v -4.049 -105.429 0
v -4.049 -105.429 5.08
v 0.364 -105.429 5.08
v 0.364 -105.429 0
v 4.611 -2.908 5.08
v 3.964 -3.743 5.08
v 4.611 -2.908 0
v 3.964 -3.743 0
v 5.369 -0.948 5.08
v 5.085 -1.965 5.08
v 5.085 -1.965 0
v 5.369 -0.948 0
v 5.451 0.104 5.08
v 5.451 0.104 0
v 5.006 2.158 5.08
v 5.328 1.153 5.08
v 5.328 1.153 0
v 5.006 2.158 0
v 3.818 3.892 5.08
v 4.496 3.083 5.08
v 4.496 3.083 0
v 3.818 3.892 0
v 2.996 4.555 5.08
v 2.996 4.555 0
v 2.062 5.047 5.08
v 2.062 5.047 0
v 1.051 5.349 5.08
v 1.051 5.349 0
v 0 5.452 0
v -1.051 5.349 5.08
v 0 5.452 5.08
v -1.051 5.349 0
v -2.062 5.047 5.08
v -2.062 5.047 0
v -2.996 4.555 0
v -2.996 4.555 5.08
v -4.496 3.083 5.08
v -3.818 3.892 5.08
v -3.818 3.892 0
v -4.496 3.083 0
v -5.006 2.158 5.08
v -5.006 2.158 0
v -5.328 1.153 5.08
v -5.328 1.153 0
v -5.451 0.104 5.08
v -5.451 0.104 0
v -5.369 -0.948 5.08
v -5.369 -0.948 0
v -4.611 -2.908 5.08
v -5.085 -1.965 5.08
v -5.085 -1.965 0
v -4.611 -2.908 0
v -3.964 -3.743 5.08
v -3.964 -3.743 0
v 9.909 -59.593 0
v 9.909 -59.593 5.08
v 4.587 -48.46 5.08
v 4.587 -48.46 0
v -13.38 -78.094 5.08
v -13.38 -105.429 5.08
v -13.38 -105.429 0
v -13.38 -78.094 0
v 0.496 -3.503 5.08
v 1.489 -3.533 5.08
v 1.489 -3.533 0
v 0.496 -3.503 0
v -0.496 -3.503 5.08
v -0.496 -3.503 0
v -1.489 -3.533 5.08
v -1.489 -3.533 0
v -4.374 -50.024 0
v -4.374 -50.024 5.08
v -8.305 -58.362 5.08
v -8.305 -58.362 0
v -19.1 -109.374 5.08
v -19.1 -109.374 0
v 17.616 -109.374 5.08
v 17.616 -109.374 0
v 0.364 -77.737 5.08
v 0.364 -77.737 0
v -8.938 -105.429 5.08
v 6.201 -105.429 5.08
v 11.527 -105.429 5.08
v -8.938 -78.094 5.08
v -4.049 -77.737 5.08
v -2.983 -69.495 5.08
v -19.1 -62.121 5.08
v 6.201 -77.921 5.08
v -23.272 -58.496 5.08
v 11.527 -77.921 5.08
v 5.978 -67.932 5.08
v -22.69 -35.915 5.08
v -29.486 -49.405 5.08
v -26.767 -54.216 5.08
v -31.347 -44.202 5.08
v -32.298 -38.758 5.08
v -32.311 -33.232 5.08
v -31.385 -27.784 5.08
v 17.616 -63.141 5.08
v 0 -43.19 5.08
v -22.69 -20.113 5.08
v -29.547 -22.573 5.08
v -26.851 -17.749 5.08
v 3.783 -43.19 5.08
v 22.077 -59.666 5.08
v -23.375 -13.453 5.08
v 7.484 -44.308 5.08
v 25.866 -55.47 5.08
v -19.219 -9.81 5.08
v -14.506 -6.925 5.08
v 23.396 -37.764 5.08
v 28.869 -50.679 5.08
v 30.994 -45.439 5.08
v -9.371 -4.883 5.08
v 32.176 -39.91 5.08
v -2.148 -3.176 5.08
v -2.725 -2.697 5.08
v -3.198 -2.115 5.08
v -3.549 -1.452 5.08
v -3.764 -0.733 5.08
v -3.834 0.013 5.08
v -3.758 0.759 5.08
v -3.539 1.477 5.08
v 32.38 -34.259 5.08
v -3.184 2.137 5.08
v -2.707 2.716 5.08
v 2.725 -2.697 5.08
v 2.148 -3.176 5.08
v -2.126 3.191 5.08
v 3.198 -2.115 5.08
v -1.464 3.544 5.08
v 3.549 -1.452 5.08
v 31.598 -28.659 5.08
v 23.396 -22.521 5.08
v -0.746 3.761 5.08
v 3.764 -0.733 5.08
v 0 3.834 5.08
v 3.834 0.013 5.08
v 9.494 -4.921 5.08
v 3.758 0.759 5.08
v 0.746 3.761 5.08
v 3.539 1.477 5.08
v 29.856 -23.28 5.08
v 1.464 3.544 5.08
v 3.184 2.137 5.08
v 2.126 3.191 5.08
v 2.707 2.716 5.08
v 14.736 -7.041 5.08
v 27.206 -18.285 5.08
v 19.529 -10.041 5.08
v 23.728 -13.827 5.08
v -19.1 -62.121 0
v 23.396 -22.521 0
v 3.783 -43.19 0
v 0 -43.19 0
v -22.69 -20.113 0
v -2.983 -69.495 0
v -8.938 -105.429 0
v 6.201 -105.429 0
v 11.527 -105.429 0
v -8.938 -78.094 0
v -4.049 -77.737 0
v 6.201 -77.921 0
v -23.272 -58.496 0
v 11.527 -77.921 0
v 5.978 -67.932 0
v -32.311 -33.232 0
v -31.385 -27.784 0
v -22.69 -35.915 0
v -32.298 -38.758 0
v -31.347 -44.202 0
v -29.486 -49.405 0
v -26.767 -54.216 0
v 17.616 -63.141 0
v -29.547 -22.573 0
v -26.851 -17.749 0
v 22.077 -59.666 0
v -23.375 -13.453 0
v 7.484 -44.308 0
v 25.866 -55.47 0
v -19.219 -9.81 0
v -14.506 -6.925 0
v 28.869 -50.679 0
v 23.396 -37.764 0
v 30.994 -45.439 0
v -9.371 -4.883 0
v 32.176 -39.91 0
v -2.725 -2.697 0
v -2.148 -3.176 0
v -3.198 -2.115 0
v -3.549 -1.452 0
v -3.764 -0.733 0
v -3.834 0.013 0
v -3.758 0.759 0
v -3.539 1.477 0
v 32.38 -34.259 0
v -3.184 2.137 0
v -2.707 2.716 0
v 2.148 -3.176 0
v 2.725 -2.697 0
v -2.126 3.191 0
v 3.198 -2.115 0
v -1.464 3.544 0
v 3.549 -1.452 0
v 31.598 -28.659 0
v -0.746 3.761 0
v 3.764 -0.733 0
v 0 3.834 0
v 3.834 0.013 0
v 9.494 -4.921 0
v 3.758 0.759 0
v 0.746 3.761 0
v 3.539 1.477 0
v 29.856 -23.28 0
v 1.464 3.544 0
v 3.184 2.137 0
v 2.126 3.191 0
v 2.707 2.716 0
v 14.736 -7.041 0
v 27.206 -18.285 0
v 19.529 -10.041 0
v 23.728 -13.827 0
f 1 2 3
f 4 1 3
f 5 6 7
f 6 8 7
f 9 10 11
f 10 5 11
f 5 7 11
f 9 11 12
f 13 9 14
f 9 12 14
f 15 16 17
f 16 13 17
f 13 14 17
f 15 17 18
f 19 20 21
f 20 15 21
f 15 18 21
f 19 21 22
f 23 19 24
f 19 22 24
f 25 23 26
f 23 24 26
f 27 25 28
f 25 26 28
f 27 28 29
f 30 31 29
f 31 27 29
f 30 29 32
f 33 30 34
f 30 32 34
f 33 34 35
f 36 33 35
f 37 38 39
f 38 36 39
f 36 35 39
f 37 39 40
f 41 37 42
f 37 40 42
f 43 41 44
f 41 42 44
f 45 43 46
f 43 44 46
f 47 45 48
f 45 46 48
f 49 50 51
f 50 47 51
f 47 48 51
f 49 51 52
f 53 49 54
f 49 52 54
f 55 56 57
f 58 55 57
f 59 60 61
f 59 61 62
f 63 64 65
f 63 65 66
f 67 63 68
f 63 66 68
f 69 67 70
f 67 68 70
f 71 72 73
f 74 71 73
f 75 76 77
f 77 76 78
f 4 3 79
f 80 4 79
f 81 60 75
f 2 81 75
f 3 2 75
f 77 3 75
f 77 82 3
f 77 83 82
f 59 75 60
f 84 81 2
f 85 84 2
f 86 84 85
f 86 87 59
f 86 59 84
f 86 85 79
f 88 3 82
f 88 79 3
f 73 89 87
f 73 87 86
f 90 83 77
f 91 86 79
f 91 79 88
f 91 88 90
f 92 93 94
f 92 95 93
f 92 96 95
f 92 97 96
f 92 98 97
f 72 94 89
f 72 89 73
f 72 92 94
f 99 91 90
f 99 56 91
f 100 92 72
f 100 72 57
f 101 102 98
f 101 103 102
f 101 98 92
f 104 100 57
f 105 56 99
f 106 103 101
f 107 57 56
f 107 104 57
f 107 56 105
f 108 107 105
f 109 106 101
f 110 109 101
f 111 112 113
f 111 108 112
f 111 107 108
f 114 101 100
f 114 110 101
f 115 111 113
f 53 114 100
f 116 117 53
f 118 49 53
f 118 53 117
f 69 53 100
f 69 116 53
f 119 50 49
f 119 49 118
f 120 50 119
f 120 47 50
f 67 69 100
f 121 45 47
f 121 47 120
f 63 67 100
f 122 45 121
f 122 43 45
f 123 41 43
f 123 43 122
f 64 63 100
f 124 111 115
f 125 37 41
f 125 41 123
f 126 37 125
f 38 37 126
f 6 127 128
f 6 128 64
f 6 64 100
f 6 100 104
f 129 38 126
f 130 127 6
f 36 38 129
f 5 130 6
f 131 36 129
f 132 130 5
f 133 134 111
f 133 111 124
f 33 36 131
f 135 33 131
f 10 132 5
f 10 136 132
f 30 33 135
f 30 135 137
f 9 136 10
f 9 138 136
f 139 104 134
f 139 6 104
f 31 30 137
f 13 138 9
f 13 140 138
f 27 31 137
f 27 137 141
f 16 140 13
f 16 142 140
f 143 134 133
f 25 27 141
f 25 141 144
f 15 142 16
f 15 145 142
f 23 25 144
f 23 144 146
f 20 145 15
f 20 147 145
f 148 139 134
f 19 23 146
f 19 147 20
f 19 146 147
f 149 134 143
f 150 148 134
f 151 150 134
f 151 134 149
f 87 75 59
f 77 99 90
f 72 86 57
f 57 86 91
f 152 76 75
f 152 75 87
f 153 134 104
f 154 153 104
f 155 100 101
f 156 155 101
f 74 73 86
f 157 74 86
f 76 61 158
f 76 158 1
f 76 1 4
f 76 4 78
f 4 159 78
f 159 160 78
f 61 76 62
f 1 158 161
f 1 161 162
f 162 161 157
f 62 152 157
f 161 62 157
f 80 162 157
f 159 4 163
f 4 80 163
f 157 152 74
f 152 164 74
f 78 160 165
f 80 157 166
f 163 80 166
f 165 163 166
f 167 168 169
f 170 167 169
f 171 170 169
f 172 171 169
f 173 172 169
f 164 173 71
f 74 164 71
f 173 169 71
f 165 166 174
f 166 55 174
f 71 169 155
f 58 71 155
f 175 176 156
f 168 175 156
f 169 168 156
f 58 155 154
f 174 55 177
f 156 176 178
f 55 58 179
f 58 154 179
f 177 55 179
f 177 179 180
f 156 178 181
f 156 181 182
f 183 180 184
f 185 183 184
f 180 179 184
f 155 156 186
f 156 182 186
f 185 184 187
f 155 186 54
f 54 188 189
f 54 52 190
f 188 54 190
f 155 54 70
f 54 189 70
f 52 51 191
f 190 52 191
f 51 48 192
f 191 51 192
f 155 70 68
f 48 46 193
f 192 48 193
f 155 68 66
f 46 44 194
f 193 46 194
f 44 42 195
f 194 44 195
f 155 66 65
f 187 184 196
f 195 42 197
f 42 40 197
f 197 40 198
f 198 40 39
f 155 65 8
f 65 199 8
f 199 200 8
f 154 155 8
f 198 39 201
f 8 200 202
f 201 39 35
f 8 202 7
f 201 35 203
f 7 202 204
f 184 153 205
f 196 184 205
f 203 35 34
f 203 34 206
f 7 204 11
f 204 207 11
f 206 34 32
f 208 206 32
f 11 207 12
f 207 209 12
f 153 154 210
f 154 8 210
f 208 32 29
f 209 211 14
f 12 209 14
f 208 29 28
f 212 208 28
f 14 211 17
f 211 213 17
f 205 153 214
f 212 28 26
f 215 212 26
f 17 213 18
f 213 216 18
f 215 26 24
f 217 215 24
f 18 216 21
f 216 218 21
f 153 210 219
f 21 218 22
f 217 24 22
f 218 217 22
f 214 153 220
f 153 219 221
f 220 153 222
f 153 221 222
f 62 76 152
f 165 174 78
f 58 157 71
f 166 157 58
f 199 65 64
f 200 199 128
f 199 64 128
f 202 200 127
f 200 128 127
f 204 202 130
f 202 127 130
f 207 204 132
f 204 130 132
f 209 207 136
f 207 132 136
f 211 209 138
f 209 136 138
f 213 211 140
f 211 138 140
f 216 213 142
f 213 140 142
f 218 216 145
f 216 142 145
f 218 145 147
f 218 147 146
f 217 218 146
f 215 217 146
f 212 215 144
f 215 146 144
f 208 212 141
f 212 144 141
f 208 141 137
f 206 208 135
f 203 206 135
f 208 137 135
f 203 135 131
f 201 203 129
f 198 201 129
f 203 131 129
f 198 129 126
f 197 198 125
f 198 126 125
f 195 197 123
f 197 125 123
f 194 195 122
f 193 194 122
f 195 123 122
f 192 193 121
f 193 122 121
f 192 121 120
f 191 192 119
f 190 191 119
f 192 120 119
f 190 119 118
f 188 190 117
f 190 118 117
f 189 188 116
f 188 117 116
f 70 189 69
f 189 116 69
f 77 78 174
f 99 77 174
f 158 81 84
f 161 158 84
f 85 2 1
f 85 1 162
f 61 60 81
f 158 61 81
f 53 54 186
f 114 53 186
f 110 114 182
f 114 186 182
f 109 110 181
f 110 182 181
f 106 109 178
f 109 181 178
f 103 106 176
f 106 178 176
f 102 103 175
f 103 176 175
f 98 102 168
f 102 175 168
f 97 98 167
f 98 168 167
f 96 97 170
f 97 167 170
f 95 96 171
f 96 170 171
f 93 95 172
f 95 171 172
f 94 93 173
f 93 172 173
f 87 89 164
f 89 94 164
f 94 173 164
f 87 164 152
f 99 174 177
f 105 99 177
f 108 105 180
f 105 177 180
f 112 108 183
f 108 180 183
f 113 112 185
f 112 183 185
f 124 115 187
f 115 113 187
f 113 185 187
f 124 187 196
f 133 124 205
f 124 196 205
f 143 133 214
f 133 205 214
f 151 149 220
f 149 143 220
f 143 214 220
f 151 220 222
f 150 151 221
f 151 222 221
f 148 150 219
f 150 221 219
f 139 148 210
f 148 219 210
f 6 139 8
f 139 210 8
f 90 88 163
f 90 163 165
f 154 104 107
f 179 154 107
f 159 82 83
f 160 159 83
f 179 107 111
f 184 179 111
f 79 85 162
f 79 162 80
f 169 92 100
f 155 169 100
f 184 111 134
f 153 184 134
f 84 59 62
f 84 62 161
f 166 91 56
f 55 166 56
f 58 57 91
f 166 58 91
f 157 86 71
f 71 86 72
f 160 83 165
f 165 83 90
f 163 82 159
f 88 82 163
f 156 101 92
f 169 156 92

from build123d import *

# Parameters (mm, degrees)
F0_R      = 5.45168
F1_DEPTH  = 5.08
F2_R      = 3.834329
F3_DEPTH  = 25.4
F4_R      = 32.422249
F5_DEPTH  = 5.08
F6_W      = 36.716256
F6_H      = 65.308068
F7_DEPTH  = 5.08
F9_W      = 4.441859
F9_H      = 27.334548
F9_W_2    = 4.413207
F9_H_2    = 27.691893
F9_W_3    = 5.325806
F9_H_3    = 27.507089
F10_DEPTH = 25.4
F12_DEPTH = 25.4
F14_DEPTH = 25.4


with BuildPart() as f1:
    # F0 (on Top) → F1 (new body)
    with BuildSketch(Plane.XY):
        Circle(F0_R)
    extrude(amount=F1_DEPTH)

    # F2 (on face) → F3 (cut)
    with BuildSketch(Plane.XY.offset(5.08)):
        Circle(F2_R)
    extrude(amount=-F3_DEPTH, mode=Mode.SUBTRACT)

    # F4 (on Top) → F5 (join)
    with BuildSketch(Plane.XY):
        with Locations((0, -35.921536)):
            Circle(F4_R)
    extrude(amount=F5_DEPTH)

    # F6 (on Top) → F7 (join)
    with BuildSketch(Plane.XY):
        with Locations((-0.742003, -76.719692)):
            Rectangle(F6_W, F6_H)
    extrude(amount=F7_DEPTH)

    # F9 (on face) → F10 (cut)
    with BuildSketch(Plane.XY.offset(5.08)):
        with Locations((-11.158781, -91.761265)):
            Rectangle(F9_W, F9_H)
        with Locations((-1.842302, -91.582593)):
            Rectangle(F9_W_2, F9_H_2)
        with Locations((8.863835, -91.674994)):
            Rectangle(F9_W_3, F9_H_3)
    extrude(amount=-F10_DEPTH, mode=Mode.SUBTRACT)

    # F11 (on face) → F12 (cut)
    with BuildSketch(Plane.XY.offset(5.08)):
        Polygon((9.909331, -59.593312), (4.586765, -48.460342), (5.977736, -67.931563), align=None)
        Polygon((-8.305341, -58.362357), (-2.982776, -69.495328), (-4.373746, -50.024107), align=None)
    extrude(amount=-F12_DEPTH, mode=Mode.SUBTRACT)

    # F13 (on face) → F14 (cut)
    with BuildSketch(Plane.XY.offset(5.08)):
        Polygon((23.395628, -22.520874), (3.782702, -43.190122), (7.484366, -44.308007), (23.395628, -37.764173), align=None)
        Polygon((0, -43.190122), (-22.690315, -20.113243), (-22.690315, -35.91549), align=None)
    extrude(amount=-F14_DEPTH, mode=Mode.SUBTRACT)


solid = f1.part
